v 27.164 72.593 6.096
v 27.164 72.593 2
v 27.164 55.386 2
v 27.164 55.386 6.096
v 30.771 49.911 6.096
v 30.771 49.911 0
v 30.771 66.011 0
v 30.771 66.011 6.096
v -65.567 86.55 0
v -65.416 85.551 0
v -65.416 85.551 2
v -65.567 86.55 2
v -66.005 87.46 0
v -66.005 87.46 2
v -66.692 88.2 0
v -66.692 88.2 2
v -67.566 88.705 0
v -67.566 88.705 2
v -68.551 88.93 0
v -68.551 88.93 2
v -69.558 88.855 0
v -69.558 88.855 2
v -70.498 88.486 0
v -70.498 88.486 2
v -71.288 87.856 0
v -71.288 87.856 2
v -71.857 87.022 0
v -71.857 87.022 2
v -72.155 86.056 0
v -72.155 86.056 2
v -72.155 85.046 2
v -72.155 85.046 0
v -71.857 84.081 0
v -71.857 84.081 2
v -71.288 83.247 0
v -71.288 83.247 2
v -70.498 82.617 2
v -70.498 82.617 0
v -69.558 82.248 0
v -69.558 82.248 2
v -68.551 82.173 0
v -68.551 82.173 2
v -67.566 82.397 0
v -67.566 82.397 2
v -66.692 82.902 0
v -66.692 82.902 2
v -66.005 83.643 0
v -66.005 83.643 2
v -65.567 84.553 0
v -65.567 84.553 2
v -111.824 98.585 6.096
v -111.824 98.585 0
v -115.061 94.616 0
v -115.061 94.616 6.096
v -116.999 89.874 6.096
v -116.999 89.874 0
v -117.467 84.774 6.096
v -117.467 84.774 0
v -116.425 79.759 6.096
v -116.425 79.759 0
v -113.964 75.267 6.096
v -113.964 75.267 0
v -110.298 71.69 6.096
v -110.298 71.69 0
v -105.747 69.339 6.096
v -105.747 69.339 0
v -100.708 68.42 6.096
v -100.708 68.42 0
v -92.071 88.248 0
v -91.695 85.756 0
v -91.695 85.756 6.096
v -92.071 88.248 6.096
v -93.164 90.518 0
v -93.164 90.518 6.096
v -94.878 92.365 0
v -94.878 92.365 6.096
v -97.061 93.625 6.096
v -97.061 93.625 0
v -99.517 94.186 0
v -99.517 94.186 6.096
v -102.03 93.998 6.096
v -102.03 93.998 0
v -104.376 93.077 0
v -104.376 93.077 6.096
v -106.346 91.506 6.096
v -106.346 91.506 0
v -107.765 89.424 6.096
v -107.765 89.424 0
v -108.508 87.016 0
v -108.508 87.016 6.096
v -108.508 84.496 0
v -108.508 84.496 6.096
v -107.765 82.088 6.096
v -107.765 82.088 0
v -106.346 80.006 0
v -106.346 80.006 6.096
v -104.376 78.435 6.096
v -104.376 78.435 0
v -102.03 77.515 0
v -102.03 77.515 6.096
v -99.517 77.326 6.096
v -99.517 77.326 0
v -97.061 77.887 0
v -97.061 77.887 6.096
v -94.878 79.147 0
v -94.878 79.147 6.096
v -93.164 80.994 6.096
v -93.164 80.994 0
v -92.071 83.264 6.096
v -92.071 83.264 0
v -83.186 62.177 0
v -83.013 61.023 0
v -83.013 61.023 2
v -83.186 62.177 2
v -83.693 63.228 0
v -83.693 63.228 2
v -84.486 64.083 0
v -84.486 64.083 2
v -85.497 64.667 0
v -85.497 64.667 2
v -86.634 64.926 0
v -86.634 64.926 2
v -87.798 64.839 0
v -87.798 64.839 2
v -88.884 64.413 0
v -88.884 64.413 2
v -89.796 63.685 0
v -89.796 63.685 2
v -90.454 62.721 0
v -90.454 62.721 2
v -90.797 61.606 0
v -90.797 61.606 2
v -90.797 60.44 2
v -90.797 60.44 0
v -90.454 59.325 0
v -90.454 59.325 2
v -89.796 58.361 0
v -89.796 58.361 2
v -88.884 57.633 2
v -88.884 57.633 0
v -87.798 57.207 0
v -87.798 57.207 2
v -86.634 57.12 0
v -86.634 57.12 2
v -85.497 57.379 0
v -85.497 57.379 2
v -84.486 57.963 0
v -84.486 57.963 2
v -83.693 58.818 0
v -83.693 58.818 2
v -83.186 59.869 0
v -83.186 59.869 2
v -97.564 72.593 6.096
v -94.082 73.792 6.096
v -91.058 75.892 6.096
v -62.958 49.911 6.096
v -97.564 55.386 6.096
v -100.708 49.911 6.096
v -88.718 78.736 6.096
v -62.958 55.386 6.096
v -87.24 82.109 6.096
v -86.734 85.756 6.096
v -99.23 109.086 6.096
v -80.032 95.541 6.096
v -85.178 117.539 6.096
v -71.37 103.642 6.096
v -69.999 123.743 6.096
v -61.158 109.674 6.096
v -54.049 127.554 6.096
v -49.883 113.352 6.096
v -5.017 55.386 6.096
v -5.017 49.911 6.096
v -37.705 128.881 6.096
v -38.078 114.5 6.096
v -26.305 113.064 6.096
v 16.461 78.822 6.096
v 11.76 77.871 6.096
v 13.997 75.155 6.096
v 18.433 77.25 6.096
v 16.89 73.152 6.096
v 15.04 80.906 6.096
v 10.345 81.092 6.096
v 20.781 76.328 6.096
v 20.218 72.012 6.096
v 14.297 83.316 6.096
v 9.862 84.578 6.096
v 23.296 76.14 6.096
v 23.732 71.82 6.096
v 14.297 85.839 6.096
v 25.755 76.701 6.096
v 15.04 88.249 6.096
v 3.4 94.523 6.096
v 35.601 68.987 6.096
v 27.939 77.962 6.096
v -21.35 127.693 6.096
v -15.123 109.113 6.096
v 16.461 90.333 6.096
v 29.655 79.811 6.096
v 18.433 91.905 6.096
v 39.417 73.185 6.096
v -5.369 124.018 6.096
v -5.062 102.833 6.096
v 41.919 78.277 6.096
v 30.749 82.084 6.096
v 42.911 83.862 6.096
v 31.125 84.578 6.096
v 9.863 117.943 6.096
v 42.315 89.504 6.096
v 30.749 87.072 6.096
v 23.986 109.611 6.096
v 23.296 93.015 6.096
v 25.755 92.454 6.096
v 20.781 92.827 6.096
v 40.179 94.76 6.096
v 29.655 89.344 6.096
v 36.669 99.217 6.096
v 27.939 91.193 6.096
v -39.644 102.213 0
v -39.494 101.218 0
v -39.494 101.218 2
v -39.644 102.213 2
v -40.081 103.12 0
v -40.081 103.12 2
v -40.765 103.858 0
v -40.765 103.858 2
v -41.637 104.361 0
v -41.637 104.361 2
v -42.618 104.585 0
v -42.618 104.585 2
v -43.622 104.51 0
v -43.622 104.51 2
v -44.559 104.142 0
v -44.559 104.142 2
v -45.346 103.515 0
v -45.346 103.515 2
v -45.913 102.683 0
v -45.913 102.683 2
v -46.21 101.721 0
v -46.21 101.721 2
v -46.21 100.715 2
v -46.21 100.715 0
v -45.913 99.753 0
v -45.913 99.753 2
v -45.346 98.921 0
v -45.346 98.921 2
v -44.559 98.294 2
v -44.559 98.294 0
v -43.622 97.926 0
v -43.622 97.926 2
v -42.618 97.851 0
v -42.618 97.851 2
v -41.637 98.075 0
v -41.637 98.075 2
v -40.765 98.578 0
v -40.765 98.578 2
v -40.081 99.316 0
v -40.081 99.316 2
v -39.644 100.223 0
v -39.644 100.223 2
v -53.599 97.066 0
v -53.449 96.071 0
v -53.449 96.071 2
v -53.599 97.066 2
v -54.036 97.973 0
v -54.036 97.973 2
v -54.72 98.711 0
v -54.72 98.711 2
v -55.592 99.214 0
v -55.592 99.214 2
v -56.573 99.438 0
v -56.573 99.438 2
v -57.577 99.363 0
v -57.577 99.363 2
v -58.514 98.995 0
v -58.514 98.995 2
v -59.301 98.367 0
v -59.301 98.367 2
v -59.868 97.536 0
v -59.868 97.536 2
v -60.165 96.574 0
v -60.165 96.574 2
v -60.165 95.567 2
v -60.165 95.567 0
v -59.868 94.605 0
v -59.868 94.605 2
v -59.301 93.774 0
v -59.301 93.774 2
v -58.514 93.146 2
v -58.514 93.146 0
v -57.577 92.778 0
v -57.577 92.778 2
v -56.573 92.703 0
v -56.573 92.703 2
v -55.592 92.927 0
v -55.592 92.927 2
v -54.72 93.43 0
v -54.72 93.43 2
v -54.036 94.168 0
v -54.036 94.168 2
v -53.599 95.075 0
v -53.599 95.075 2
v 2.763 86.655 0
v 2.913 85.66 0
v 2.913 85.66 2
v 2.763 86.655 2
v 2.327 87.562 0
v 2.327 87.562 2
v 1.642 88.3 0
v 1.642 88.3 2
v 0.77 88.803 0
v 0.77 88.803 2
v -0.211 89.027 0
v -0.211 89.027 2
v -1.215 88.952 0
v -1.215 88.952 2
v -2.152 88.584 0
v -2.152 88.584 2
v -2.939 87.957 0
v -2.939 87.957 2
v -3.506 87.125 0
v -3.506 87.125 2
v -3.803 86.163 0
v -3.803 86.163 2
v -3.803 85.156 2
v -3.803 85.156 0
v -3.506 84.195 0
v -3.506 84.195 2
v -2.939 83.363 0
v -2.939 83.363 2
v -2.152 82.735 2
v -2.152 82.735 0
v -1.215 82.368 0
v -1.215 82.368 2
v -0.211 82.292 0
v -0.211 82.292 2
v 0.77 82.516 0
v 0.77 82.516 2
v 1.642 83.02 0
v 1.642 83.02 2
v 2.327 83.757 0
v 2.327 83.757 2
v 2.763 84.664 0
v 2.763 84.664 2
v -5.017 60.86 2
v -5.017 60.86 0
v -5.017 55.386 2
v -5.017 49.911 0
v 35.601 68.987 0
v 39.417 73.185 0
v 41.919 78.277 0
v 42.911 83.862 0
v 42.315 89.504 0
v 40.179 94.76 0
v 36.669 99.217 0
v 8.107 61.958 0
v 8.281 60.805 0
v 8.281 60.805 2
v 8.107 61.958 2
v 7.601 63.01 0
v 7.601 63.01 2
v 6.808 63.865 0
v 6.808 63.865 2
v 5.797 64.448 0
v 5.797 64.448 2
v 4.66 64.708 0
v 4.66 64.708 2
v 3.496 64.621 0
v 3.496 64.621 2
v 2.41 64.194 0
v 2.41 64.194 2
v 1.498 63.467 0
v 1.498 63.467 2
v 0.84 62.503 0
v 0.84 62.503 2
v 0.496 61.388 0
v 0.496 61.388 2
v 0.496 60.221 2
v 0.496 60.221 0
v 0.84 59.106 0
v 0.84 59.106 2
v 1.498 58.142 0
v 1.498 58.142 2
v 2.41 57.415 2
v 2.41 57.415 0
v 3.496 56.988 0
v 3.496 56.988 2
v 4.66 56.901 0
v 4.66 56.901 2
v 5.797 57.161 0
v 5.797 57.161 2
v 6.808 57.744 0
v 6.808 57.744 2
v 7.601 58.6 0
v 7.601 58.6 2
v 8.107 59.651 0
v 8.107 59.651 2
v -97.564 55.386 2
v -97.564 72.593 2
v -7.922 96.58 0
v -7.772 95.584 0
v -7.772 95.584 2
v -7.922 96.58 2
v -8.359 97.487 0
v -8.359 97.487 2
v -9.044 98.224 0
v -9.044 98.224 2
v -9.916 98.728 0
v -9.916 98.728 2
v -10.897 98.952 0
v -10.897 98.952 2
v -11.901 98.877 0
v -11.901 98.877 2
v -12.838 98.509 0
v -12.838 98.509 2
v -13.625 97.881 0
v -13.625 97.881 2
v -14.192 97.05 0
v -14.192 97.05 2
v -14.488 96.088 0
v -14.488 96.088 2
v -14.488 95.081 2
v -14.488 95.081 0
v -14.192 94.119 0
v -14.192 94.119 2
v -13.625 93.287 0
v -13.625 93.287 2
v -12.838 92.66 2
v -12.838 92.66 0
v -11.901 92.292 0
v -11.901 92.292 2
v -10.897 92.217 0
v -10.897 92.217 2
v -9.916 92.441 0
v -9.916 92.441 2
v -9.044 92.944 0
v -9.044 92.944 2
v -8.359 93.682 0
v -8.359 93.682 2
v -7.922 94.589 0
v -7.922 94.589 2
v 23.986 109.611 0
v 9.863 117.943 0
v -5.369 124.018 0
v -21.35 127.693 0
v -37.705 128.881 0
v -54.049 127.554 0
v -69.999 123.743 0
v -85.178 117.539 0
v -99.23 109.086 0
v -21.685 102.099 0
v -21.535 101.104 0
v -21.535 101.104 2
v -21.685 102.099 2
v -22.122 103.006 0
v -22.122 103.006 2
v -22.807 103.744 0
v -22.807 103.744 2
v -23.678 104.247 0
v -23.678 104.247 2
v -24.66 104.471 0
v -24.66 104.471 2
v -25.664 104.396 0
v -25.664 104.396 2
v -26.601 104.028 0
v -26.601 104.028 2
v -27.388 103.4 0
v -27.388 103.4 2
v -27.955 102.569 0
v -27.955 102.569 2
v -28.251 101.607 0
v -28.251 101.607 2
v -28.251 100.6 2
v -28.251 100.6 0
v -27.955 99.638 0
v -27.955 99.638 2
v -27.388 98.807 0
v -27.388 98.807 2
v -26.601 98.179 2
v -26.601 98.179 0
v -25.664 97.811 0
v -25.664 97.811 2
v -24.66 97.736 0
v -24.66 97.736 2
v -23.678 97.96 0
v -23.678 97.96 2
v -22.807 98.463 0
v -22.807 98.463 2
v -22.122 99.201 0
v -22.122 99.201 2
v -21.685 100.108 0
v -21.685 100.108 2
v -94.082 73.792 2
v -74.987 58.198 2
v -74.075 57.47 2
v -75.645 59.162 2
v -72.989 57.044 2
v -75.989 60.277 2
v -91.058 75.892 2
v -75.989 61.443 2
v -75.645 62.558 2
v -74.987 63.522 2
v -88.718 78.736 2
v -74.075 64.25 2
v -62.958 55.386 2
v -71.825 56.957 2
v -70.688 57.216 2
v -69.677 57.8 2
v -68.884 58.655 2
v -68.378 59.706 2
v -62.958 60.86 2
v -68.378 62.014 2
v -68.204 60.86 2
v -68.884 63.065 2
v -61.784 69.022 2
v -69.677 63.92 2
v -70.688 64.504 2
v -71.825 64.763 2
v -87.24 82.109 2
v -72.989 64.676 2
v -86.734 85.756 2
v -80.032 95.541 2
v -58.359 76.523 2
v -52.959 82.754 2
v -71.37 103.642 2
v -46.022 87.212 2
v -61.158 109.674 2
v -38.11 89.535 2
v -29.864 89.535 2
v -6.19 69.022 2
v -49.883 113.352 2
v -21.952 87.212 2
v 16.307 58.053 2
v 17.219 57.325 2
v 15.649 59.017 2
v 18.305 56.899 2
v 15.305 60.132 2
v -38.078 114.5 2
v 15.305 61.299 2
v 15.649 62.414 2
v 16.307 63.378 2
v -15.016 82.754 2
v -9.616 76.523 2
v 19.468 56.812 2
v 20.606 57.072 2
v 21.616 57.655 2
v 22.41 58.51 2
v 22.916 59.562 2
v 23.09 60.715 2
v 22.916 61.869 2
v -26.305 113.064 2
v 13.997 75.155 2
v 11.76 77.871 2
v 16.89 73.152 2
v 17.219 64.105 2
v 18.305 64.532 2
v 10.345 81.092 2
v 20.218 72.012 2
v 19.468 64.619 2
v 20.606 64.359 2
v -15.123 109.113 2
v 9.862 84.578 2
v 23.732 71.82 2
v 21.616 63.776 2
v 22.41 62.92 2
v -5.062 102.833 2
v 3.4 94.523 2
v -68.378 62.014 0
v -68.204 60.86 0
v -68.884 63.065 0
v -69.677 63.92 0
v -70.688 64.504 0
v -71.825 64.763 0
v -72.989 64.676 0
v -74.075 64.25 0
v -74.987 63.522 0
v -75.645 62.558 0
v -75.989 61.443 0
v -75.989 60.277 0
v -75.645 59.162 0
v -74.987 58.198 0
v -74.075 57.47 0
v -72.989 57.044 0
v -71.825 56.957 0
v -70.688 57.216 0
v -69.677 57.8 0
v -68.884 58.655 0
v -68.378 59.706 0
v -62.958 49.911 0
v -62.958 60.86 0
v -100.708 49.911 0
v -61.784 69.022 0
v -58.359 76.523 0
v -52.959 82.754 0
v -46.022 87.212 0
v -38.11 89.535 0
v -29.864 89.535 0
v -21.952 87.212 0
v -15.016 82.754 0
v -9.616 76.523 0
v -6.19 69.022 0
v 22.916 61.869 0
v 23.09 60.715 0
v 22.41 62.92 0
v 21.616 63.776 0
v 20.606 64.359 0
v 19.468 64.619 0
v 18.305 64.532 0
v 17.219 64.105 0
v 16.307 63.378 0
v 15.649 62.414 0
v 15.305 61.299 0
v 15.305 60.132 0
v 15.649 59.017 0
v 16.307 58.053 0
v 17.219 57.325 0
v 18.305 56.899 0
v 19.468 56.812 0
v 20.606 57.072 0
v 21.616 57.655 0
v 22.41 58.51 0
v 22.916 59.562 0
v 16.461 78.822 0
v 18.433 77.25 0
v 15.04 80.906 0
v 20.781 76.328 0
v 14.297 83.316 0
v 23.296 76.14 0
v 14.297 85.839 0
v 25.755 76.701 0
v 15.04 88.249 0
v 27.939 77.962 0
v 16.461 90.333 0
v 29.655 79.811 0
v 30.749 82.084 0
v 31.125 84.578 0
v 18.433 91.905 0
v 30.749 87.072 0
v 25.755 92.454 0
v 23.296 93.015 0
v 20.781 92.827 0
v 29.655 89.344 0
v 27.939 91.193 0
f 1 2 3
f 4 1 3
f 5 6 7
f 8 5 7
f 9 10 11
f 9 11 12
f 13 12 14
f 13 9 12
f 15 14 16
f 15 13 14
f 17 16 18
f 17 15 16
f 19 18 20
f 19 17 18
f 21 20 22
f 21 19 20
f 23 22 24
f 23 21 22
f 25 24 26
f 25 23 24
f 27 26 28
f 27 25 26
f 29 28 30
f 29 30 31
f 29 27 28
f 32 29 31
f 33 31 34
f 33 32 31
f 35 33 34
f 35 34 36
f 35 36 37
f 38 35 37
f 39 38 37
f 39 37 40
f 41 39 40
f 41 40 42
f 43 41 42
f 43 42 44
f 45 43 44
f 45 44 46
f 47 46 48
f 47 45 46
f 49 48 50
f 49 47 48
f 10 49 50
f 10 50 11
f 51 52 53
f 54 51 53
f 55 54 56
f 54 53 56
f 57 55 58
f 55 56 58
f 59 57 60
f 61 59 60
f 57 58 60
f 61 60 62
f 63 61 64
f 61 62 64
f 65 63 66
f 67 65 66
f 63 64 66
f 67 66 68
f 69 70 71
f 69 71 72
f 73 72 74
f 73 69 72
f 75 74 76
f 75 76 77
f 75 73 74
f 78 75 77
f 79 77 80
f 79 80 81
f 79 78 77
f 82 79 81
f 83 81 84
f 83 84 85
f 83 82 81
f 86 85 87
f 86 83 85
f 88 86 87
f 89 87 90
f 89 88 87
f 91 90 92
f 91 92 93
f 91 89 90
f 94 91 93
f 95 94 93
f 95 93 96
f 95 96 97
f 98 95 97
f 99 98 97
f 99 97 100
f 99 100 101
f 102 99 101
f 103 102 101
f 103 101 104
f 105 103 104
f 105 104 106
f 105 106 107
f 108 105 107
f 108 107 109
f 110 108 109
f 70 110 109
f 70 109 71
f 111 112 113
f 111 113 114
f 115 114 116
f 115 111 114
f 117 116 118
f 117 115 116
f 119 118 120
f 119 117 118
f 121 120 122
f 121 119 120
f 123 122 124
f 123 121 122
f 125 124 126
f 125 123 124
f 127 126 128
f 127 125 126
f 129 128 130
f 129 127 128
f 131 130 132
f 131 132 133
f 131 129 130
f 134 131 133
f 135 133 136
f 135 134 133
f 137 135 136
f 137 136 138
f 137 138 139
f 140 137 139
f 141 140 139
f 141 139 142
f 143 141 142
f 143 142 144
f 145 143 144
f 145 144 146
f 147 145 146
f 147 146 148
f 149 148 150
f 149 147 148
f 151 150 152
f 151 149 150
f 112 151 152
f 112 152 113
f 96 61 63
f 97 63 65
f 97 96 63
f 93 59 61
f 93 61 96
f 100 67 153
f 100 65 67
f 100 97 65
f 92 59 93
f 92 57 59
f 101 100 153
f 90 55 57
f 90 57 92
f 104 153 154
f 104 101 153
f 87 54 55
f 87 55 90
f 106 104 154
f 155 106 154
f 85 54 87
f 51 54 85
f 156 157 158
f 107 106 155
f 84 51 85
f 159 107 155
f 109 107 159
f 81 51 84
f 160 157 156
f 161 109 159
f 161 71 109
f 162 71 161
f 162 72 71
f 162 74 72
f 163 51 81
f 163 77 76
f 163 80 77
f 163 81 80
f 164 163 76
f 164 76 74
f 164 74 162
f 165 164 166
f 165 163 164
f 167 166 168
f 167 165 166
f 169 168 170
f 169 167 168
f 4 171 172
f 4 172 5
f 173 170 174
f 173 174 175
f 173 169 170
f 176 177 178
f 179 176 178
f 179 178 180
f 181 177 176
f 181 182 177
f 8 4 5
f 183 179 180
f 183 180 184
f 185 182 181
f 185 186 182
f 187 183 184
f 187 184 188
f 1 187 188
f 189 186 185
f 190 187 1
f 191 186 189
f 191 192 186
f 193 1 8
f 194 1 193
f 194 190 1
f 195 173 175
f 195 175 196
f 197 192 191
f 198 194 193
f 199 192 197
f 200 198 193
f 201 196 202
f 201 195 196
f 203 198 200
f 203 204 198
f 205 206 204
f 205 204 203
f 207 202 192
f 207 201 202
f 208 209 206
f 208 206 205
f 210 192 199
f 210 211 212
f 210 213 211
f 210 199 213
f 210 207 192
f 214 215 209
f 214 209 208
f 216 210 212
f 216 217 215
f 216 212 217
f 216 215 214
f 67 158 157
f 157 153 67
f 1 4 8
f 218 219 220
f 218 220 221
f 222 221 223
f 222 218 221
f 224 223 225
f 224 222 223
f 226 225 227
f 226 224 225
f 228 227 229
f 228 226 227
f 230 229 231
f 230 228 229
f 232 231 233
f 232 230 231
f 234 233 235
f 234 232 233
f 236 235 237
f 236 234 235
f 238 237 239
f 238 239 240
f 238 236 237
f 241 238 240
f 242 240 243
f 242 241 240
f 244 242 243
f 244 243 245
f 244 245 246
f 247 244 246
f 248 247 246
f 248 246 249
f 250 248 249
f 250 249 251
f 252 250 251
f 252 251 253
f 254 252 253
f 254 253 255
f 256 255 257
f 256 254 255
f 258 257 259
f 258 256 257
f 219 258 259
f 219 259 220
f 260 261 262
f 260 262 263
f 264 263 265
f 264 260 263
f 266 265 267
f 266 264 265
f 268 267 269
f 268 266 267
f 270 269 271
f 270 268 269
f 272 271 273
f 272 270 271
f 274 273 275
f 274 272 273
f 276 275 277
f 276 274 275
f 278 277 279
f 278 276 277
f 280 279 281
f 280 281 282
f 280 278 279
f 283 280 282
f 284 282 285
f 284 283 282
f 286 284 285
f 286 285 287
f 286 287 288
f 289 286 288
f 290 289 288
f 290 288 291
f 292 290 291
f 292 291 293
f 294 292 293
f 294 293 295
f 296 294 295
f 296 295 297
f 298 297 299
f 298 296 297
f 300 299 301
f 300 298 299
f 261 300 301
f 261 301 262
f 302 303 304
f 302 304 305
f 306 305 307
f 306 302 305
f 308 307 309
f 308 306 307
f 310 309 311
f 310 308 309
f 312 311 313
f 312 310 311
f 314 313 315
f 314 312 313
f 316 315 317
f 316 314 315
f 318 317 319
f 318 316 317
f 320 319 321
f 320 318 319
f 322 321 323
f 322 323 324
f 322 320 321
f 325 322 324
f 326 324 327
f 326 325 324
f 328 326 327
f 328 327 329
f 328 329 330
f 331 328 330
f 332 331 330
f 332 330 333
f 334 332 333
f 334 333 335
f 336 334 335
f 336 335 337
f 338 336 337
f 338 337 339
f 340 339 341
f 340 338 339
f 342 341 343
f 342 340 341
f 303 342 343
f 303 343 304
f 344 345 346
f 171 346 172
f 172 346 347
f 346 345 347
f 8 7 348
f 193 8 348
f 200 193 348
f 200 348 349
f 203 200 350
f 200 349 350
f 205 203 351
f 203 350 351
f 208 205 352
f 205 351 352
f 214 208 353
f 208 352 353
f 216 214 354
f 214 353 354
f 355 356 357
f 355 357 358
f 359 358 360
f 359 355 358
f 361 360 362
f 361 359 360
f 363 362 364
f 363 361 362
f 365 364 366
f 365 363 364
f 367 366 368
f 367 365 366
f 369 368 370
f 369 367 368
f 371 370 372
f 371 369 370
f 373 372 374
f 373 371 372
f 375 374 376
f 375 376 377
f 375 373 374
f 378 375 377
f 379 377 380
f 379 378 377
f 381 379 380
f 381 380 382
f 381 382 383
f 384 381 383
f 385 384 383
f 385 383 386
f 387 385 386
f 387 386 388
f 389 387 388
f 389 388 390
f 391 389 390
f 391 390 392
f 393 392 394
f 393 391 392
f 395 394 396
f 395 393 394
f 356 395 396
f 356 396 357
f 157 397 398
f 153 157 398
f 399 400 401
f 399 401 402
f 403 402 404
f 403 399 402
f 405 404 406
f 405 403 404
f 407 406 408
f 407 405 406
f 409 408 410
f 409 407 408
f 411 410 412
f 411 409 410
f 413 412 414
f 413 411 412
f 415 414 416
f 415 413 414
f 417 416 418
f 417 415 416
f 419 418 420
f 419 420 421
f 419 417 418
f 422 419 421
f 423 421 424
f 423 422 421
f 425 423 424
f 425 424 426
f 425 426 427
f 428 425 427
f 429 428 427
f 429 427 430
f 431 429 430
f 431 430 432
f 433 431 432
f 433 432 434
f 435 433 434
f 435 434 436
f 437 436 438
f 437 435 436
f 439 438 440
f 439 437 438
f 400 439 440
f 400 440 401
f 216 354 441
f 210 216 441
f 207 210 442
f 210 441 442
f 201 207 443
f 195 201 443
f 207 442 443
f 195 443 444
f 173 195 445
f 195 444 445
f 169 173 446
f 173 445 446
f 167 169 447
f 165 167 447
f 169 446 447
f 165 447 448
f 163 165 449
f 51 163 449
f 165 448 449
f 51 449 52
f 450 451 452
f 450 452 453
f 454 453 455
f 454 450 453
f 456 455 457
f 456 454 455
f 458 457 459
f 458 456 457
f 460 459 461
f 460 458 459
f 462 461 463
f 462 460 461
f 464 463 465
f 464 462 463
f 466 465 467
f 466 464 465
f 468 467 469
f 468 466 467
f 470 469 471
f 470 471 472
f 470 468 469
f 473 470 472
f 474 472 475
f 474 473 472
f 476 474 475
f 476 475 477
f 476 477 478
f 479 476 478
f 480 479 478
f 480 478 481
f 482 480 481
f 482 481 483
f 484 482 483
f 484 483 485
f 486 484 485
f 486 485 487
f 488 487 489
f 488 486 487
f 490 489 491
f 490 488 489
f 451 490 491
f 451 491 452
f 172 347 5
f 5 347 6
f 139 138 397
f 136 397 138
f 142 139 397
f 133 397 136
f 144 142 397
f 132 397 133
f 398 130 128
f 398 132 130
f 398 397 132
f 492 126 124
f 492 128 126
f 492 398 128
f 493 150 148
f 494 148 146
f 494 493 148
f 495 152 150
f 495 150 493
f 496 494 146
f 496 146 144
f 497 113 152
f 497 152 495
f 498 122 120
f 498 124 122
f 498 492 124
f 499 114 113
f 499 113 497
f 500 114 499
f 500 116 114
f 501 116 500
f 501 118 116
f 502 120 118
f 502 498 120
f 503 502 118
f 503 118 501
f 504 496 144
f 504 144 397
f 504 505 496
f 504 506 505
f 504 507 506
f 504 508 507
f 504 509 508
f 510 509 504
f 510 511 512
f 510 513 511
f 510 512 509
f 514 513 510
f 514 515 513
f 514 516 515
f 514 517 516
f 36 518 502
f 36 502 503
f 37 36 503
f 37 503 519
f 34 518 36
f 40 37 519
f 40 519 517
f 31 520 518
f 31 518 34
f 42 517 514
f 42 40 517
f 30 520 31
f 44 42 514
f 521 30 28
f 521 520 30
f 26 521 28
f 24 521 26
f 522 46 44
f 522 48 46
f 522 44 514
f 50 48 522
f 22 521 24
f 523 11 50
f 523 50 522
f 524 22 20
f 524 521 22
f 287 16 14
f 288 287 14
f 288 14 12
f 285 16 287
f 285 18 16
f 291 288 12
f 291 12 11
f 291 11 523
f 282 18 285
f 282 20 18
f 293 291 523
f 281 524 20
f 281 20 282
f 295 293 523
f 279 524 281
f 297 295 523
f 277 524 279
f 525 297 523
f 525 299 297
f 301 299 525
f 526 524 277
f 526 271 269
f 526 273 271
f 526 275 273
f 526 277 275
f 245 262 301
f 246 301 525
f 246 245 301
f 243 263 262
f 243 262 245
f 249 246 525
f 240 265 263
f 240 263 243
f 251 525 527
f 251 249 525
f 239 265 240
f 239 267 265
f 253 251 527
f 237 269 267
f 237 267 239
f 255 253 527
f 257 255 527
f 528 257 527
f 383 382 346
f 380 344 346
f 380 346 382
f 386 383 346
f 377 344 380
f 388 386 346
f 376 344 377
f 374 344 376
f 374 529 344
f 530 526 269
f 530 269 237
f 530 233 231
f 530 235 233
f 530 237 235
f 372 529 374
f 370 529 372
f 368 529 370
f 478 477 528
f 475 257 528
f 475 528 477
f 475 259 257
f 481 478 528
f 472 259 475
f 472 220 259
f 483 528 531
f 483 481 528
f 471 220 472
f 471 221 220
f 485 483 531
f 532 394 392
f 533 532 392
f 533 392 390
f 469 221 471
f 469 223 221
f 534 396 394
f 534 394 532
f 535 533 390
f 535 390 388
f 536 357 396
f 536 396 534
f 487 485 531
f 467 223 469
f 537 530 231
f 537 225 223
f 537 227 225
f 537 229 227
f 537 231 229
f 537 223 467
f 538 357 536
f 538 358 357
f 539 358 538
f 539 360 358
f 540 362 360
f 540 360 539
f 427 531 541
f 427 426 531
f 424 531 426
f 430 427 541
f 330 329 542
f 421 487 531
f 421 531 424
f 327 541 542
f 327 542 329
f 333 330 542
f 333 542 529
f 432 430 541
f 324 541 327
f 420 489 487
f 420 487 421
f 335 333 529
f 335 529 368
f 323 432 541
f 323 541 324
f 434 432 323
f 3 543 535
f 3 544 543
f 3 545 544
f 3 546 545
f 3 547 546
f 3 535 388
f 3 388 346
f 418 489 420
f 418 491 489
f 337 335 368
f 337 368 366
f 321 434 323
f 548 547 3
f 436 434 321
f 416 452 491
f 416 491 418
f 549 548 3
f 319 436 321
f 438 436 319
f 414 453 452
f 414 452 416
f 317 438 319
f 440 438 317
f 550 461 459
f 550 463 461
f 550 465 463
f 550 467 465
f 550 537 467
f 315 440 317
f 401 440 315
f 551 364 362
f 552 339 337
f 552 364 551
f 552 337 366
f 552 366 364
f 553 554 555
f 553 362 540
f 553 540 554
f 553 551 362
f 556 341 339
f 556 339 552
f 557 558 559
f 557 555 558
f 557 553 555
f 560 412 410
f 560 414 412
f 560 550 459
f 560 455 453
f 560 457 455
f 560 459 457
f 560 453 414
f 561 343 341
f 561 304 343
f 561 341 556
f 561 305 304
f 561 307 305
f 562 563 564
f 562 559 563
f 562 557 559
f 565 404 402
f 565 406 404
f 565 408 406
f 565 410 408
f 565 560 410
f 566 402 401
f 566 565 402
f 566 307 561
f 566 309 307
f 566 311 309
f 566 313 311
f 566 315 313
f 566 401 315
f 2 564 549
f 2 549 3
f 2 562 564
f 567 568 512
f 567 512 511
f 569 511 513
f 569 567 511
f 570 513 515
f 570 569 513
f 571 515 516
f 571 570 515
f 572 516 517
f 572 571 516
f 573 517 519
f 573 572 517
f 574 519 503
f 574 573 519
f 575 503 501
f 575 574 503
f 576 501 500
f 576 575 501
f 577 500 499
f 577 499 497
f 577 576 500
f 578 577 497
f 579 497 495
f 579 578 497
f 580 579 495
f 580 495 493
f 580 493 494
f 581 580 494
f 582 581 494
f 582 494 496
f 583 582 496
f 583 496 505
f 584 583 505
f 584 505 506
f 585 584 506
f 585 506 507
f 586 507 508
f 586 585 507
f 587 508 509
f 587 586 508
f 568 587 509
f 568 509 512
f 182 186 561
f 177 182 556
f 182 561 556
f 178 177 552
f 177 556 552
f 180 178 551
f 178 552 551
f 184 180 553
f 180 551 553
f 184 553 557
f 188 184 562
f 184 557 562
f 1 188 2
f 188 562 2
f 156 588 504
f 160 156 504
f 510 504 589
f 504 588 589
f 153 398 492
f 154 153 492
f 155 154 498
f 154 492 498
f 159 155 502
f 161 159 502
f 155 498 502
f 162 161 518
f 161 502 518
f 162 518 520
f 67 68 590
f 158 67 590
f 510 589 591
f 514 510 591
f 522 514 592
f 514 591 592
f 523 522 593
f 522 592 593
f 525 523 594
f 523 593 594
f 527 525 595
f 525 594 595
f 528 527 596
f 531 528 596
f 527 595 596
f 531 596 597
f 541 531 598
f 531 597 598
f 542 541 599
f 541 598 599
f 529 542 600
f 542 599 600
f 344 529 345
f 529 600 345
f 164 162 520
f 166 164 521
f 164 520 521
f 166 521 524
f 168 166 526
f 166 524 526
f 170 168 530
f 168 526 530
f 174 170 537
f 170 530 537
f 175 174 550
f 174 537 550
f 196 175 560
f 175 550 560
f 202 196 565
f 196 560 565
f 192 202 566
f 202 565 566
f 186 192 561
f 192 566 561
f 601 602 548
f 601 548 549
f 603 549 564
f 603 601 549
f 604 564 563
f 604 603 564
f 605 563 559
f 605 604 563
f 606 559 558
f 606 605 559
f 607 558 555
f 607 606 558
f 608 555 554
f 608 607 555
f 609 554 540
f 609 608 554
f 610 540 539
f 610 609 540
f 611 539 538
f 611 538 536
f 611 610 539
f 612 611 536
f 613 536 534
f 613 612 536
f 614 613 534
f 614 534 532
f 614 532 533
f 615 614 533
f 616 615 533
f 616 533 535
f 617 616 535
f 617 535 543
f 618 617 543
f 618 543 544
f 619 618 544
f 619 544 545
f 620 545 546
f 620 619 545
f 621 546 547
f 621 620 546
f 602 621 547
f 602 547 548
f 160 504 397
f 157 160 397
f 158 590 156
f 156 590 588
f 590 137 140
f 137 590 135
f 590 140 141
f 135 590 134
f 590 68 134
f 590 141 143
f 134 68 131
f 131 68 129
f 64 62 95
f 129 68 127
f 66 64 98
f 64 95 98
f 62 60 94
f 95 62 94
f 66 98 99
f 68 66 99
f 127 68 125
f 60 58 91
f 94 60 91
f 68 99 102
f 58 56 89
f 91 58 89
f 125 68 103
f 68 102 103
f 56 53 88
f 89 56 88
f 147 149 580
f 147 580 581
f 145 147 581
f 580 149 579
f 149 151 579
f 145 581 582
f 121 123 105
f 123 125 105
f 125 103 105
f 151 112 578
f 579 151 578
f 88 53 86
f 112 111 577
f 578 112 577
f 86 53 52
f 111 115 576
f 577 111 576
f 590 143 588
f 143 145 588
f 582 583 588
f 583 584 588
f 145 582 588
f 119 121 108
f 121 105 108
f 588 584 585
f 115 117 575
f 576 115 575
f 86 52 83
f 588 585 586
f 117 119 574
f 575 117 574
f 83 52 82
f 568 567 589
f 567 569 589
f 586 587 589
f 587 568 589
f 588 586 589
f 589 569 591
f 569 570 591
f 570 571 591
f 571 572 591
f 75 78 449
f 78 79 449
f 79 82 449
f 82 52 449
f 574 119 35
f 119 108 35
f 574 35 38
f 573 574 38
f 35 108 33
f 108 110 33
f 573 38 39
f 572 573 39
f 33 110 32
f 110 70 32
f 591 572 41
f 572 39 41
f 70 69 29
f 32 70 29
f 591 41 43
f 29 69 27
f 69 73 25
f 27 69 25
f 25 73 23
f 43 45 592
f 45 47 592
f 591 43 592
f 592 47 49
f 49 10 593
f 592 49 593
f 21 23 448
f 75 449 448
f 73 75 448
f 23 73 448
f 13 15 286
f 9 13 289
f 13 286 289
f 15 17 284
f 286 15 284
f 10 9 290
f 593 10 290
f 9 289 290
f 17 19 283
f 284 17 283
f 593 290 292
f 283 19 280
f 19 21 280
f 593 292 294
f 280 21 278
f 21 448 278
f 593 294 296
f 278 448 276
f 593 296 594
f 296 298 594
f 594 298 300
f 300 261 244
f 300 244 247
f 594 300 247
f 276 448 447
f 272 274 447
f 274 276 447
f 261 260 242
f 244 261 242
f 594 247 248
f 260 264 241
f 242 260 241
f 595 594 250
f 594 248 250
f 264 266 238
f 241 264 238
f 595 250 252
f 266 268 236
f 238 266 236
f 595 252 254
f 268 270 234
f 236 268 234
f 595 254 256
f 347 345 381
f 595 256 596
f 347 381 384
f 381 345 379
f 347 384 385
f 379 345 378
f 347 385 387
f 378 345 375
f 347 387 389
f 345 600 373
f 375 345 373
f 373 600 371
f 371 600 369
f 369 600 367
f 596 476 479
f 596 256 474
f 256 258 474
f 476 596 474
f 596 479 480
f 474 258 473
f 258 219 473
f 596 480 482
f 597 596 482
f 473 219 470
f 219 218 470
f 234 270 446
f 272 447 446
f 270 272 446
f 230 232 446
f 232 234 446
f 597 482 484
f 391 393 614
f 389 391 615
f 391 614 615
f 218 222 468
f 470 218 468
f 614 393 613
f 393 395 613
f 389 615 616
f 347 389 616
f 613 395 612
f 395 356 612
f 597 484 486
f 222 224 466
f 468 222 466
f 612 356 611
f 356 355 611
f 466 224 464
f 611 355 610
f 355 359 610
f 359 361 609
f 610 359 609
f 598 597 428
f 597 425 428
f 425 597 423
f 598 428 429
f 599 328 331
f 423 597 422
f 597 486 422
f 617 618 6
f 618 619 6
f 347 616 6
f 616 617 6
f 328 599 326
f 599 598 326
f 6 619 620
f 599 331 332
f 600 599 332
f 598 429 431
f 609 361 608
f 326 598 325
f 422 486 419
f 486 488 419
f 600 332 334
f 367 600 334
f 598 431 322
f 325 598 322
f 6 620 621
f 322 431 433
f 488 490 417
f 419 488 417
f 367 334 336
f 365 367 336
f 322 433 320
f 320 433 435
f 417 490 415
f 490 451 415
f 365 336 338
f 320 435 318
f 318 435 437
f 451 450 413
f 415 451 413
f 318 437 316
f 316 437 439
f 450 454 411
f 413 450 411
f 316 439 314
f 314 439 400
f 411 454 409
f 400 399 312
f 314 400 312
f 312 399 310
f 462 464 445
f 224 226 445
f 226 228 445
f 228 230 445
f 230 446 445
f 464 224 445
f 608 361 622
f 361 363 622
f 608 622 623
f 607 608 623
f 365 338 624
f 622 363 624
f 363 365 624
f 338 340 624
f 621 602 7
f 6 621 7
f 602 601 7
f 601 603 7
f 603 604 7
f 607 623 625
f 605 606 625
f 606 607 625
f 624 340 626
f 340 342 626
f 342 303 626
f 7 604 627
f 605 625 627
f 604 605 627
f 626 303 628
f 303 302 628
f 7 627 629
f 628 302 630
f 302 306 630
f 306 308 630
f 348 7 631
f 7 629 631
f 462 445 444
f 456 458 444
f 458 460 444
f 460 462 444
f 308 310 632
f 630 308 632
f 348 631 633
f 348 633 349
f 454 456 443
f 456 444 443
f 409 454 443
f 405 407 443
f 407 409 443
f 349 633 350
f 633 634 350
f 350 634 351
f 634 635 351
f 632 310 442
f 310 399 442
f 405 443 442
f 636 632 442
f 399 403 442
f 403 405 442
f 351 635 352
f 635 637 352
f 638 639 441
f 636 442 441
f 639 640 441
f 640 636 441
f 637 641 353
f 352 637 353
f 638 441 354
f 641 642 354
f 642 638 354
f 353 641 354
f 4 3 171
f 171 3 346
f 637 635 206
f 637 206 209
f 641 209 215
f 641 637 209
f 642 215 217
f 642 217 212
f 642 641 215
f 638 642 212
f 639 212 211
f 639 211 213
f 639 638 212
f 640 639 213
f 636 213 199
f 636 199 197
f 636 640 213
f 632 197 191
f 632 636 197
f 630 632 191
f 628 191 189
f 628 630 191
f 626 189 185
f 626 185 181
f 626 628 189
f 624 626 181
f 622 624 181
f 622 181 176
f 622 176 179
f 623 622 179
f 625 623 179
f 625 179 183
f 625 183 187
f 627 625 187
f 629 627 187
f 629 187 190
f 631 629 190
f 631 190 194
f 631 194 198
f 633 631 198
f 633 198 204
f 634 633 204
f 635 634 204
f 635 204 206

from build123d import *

# Parameters (mm, degrees)
F0_R     = 3.9142983579
F0_R_2   = 3.3882320549
F0_R_3   = 3.3768548991
F1_DEPTH = 2
F0_R_4   = 8.4535282778
F0_R_5   = 8.4613165319
F5_DEPTH = 6
F6_DEPTH = 6
F7_DEPTH = 6.096


# Not quite as in the source:
# - the program builds the solid bodies; features that only make, move or delete a surface that nothing else refers to are left out


with BuildPart() as f1:
    # F0 (on Top) → F1 (new body)
    with BuildSketch(Plane.XY):
        with BuildLine():
            Line((-5.016844254, 60.8599856496), (-5.016844254, 55.3855970502))
            Line((-5.016844254, 55.3855970502), (27.1643232554, 55.3855970502))
            Line((27.1643232554, 55.3855970502), (27.1643232554, 72.5930482149))
            ThreePointArc((27.1643232554, 72.5930482149), (15.3743446714, 74.0537278173), (9.8619121261, 84.5775231091))
            ThreePointArc((9.8619121261, 84.5775231091), (-38.0783668351, 114.5002429814), (-86.734496244, 85.7561899899))
            ThreePointArc((-86.734496244, 85.7561899899), (-89.789886214, 77.2334083533), (-97.5642204285, 72.5930482149))
            Line((-97.5642204285, 72.5930482149), (-97.5642204285, 55.3855970502))
            Line((-97.5642204285, 55.3855970502), (-82.5288370252, 55.3855970502))
            Line((-82.5288370252, 55.3855970502), (-62.9575885832, 55.3855970502))
            Line((-62.9575885832, 55.3855970502), (-62.9575885832, 60.8599856496))
            ThreePointArc((-62.9575885832, 60.8599856496), (-33.9872164186, 89.8303578142), (-5.016844254, 60.8599856496))
        make_face()
        with Locations((-86.9268402457, 61.0230416059)):
            Circle(F0_R, mode=Mode.SUBTRACT)
        with Locations((-72.1179321408, 60.8599856496)):
            Circle(F0_R, mode=Mode.SUBTRACT)
        with Locations((-68.8042789698, 85.551418364)):
            Circle(F0_R_2, mode=Mode.SUBTRACT)
        with Locations((4.3670018204, 60.8045533299)):
            Circle(F0_R, mode=Mode.SUBTRACT)
        with Locations((19.1759099253, 60.7153773308)):
            Circle(F0_R, mode=Mode.SUBTRACT)
        with Locations((-0.4634411598, 85.6597200036)):
            Circle(F0_R_3, mode=Mode.SUBTRACT)
        with Locations((-56.8258166313, 96.0706025362)):
            Circle(F0_R_3, mode=Mode.SUBTRACT)
        with Locations((-42.8707525134, 101.2179628015)):
            Circle(F0_R_3, mode=Mode.SUBTRACT)
        with Locations((-11.1492751166, 95.5843403935)):
            Circle(F0_R_3, mode=Mode.SUBTRACT)
        with Locations((-24.9121841043, 101.1035814881)):
            Circle(F0_R_3, mode=Mode.SUBTRACT)
    extrude(amount=F1_DEPTH)

    # F0 (on Top) → F5 (join)
    with BuildSketch(Plane.XY):
        with BuildLine():
            ThreePointArc((30.7714908133, 66.0106175583), (42.611434574, 81.0345848644), (36.6692617536, 99.2168411613))
            ThreePointArc((36.6692617536, 99.2168411613), (-37.7049289316, 128.8806796099), (-111.8238263521, 98.5845974088))
            ThreePointArc((-111.8238263521, 98.5845974088), (-116.4247817384, 79.7587957054), (-100.7084514224, 68.4196351703))
            Line((-100.7084514224, 68.4196351703), (-100.7084514224, 49.9112084508))
            Line((-100.7084514224, 49.9112084508), (-62.9575885832, 49.9112084508))
            Line((-62.9575885832, 49.9112084508), (-62.9575885832, 55.3855970502))
            Line((-62.9575885832, 55.3855970502), (-82.5288370252, 55.3855970502))
            Line((-82.5288370252, 55.3855970502), (-97.5642204285, 55.3855970502))
            Line((-97.5642204285, 55.3855970502), (-97.5642204285, 72.5930482149))
            ThreePointArc((-97.5642204285, 72.5930482149), (-89.789886214, 77.2334083533), (-86.734496244, 85.7561899899))
            ThreePointArc((-86.734496244, 85.7561899899), (-38.0783668351, 114.5002429814), (9.8619121261, 84.5775231091))
            ThreePointArc((9.8619121261, 84.5775231091), (15.3743446714, 74.0537278173), (27.1643232554, 72.5930482149))
            Line((27.1643232554, 72.5930482149), (27.1643232554, 55.3855970502))
            Line((27.1643232554, 55.3855970502), (-5.016844254, 55.3855970502))
            Line((-5.016844254, 55.3855970502), (-5.016844254, 49.9112084508))
            Line((-5.016844254, 49.9112084508), (30.7714908133, 49.9112084508))
            Line((30.7714908133, 49.9112084508), (30.7714908133, 66.0106175583))
        make_face()
        with Locations((-100.1490219674, 85.7561899899)):
            Circle(F0_R_4, mode=Mode.SUBTRACT)
        with Locations((22.6636270451, 84.5775231091)):
            Circle(F0_R_5, mode=Mode.SUBTRACT)
    extrude(amount=F5_DEPTH)

    # F0 (on Top) → F6 (join)
    with BuildSketch(Plane.XY):
        with BuildLine():
            ThreePointArc((30.7714908133, 66.0106175583), (42.611434574, 81.0345848644), (36.6692617536, 99.2168411613))
            ThreePointArc((36.6692617536, 99.2168411613), (-37.7049289316, 128.8806796099), (-111.8238263521, 98.5845974088))
            ThreePointArc((-111.8238263521, 98.5845974088), (-116.4247817384, 79.7587957054), (-100.7084514224, 68.4196351703))
            Line((-100.7084514224, 68.4196351703), (-100.7084514224, 49.9112084508))
            Line((-100.7084514224, 49.9112084508), (-62.9575885832, 49.9112084508))
            Line((-62.9575885832, 49.9112084508), (-62.9575885832, 55.3855970502))
            Line((-62.9575885832, 55.3855970502), (-82.5288370252, 55.3855970502))
            Line((-82.5288370252, 55.3855970502), (-97.5642204285, 55.3855970502))
            Line((-97.5642204285, 55.3855970502), (-97.5642204285, 72.5930482149))
            ThreePointArc((-97.5642204285, 72.5930482149), (-89.789886214, 77.2334083533), (-86.734496244, 85.7561899899))
            ThreePointArc((-86.734496244, 85.7561899899), (-38.0783668351, 114.5002429814), (9.8619121261, 84.5775231091))
            ThreePointArc((9.8619121261, 84.5775231091), (15.3743446714, 74.0537278173), (27.1643232554, 72.5930482149))
            Line((27.1643232554, 72.5930482149), (27.1643232554, 55.3855970502))
            Line((27.1643232554, 55.3855970502), (-5.016844254, 55.3855970502))
            Line((-5.016844254, 55.3855970502), (-5.016844254, 49.9112084508))
            Line((-5.016844254, 49.9112084508), (30.7714908133, 49.9112084508))
            Line((30.7714908133, 49.9112084508), (30.7714908133, 66.0106175583))
        make_face()
        with Locations((-100.1490219674, 85.7561899899)):
            Circle(F0_R_4, mode=Mode.SUBTRACT)
        with Locations((22.6636270451, 84.5775231091)):
            Circle(F0_R_5, mode=Mode.SUBTRACT)
    extrude(amount=F6_DEPTH)

    # F0 (on Top) → F7 (join)
    with BuildSketch(Plane.XY):
        with BuildLine():
            ThreePointArc((30.7714908133, 66.0106175583), (42.611434574, 81.0345848644), (36.6692617536, 99.2168411613))
            ThreePointArc((36.6692617536, 99.2168411613), (-37.7049289316, 128.8806796099), (-111.8238263521, 98.5845974088))
            ThreePointArc((-111.8238263521, 98.5845974088), (-116.4247817384, 79.7587957054), (-100.7084514224, 68.4196351703))
            Line((-100.7084514224, 68.4196351703), (-100.7084514224, 49.9112084508))
            Line((-100.7084514224, 49.9112084508), (-62.9575885832, 49.9112084508))
            Line((-62.9575885832, 49.9112084508), (-62.9575885832, 55.3855970502))
            Line((-62.9575885832, 55.3855970502), (-82.5288370252, 55.3855970502))
            Line((-82.5288370252, 55.3855970502), (-97.5642204285, 55.3855970502))
            Line((-97.5642204285, 55.3855970502), (-97.5642204285, 72.5930482149))
            ThreePointArc((-97.5642204285, 72.5930482149), (-89.789886214, 77.2334083533), (-86.734496244, 85.7561899899))
            ThreePointArc((-86.734496244, 85.7561899899), (-38.0783668351, 114.5002429814), (9.8619121261, 84.5775231091))
            ThreePointArc((9.8619121261, 84.5775231091), (15.3743446714, 74.0537278173), (27.1643232554, 72.5930482149))
            Line((27.1643232554, 72.5930482149), (27.1643232554, 55.3855970502))
            Line((27.1643232554, 55.3855970502), (-5.016844254, 55.3855970502))
            Line((-5.016844254, 55.3855970502), (-5.016844254, 49.9112084508))
            Line((-5.016844254, 49.9112084508), (30.7714908133, 49.9112084508))
            Line((30.7714908133, 49.9112084508), (30.7714908133, 66.0106175583))
        make_face()
        with Locations((-100.1490219674, 85.7561899899)):
            Circle(F0_R_4, mode=Mode.SUBTRACT)
        with Locations((22.6636270451, 84.5775231091)):
            Circle(F0_R_5, mode=Mode.SUBTRACT)
    extrude(amount=F7_DEPTH)


solid = f1.part
